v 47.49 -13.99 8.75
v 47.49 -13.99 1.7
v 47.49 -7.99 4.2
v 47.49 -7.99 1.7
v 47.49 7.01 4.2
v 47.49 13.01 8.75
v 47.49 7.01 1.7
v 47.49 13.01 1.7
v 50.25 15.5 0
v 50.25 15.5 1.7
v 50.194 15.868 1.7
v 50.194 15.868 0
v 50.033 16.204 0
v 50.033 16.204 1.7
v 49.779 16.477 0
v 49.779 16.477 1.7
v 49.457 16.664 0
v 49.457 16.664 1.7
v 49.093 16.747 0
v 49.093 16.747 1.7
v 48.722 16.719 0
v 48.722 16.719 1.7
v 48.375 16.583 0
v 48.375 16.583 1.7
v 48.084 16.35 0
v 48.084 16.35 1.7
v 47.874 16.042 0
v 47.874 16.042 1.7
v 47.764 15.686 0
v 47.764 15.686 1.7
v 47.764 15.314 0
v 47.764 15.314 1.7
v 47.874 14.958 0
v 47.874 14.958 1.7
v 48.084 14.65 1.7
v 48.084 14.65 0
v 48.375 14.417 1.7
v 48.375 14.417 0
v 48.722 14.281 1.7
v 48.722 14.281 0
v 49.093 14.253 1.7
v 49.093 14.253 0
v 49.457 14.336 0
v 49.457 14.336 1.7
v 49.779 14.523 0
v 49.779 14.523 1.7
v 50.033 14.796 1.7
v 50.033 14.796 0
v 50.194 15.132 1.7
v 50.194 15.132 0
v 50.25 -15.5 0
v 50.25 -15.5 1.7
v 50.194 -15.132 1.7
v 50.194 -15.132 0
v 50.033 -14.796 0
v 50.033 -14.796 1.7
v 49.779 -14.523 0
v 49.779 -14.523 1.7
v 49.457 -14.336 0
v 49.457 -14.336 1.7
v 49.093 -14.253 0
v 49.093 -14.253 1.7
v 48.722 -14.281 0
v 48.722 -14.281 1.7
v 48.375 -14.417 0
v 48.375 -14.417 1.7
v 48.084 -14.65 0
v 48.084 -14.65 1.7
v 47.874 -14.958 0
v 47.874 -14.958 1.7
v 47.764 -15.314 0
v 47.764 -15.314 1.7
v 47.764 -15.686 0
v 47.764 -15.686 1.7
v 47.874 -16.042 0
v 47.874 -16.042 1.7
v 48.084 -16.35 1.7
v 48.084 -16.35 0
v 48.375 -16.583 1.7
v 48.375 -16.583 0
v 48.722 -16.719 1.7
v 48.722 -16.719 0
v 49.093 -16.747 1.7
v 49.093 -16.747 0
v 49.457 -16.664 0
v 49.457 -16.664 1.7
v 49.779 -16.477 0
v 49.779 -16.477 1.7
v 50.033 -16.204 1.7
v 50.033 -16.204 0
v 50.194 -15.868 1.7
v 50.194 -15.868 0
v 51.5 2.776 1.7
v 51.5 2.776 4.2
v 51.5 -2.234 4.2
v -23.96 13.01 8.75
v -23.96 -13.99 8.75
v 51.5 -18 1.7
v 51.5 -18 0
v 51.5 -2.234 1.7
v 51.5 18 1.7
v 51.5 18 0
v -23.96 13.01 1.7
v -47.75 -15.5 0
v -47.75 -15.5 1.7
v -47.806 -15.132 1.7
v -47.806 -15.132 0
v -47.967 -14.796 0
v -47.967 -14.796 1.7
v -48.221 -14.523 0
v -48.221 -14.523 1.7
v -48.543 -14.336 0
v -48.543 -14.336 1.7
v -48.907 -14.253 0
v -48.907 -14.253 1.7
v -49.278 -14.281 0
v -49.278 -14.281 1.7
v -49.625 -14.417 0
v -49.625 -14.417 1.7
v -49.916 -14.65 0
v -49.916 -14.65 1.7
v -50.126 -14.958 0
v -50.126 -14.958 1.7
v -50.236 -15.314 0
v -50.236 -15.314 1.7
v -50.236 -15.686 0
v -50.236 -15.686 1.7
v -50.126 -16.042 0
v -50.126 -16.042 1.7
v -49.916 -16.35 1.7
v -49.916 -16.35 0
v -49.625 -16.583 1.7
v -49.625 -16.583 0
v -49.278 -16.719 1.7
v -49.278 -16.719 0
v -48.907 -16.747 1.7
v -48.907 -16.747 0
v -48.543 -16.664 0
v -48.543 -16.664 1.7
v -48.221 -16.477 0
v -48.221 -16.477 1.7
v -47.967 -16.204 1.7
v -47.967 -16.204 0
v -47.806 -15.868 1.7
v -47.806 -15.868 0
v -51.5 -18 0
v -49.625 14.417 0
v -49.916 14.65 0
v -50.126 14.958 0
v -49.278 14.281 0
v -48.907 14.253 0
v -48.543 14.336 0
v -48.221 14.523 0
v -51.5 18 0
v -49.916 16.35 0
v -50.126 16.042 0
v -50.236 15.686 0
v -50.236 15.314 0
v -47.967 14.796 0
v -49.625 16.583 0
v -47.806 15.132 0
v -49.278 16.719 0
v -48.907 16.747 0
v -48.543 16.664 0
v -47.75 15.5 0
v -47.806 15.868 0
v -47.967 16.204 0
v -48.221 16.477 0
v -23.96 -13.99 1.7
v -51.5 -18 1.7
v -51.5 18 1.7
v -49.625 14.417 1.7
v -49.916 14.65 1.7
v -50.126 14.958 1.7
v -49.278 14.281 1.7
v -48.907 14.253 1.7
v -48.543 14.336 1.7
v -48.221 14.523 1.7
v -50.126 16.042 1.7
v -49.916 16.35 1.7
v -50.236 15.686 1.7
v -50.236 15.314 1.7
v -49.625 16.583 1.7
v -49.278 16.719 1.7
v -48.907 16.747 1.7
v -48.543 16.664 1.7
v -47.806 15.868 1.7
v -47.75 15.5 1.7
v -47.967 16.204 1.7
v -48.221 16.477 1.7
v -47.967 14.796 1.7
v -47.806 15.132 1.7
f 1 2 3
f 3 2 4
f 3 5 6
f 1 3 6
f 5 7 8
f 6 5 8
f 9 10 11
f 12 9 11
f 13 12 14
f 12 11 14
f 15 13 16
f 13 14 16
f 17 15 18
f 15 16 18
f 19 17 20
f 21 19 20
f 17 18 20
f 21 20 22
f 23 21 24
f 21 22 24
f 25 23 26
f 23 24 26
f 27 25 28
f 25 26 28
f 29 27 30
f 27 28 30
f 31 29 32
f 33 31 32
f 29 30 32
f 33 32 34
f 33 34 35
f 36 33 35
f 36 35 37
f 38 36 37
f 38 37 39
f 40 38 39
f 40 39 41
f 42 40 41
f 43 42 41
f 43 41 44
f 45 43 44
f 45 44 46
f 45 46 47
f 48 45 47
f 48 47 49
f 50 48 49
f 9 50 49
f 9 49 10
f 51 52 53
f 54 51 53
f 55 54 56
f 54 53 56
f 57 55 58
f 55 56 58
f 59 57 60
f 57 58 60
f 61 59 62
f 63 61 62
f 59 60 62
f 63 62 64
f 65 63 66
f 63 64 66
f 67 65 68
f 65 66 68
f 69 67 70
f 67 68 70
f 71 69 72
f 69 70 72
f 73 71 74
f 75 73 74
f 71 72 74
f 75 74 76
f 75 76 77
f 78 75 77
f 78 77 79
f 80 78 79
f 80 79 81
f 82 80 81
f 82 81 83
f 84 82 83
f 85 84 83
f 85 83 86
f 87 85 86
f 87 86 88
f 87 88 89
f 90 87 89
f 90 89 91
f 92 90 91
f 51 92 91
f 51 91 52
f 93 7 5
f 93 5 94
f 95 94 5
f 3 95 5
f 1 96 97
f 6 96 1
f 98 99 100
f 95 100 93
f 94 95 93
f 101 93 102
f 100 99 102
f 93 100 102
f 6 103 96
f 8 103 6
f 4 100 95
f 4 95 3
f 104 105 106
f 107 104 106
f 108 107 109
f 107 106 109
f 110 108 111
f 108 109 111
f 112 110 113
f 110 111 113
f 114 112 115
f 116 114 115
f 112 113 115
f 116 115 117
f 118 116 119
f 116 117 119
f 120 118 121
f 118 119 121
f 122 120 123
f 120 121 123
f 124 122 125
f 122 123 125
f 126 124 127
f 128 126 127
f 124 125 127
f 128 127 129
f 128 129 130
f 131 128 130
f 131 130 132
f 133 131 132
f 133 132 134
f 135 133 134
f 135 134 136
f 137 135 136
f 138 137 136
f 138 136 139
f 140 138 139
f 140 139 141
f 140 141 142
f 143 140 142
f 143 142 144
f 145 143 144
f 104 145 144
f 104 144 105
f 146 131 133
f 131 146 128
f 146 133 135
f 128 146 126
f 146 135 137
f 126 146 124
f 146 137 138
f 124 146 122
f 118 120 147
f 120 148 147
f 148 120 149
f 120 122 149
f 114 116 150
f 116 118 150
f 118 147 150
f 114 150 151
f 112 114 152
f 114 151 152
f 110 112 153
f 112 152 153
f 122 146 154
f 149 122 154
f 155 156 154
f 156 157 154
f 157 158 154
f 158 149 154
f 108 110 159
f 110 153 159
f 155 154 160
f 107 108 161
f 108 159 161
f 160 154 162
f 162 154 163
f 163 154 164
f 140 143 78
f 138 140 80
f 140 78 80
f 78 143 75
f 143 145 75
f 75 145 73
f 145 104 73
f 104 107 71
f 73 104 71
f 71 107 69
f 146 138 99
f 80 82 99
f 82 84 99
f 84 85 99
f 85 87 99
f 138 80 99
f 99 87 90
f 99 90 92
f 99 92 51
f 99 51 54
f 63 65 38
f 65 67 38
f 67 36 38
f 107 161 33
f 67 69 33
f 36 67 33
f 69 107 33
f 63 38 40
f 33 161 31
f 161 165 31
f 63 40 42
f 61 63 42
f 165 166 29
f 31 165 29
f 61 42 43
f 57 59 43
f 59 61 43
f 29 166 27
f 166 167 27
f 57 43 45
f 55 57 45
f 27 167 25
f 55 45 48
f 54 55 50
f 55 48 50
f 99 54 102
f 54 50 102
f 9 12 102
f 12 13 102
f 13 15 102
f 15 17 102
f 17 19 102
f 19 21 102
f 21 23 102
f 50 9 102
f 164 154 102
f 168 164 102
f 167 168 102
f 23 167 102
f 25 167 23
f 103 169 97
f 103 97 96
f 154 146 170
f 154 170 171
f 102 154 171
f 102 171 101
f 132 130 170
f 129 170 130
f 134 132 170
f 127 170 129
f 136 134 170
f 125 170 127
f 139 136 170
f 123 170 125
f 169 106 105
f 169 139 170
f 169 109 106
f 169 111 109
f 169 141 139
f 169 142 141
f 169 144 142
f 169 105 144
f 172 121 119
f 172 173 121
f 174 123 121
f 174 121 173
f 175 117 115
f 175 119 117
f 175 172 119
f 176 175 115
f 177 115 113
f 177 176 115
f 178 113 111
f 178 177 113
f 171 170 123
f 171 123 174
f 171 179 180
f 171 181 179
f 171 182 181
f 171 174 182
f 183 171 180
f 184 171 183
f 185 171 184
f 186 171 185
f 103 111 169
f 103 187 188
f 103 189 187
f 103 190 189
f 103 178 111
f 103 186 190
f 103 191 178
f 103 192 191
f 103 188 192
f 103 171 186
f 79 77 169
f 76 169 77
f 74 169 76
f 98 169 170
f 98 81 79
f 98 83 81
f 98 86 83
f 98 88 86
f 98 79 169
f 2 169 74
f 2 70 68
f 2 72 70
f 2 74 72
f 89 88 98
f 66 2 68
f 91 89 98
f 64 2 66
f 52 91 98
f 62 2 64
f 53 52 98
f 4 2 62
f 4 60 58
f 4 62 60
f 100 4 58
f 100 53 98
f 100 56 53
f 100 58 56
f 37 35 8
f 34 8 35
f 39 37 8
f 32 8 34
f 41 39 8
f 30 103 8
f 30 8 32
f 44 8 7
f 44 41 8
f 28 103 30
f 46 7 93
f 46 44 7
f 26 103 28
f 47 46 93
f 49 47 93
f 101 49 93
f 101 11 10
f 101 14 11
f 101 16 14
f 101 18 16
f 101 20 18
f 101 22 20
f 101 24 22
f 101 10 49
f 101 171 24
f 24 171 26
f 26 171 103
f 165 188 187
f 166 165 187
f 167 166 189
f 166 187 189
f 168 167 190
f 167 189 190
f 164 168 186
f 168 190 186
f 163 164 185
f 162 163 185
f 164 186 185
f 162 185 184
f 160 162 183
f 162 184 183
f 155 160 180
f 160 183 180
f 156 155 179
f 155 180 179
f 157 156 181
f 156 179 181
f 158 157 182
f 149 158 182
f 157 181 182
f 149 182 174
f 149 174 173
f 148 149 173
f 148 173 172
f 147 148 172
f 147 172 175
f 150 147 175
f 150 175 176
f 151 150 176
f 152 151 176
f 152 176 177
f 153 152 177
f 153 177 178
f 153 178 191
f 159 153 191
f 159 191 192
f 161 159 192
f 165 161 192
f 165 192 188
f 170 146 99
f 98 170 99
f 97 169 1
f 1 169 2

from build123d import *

# Parameters (mm, degrees)
CROQUIS1_W              = 103
CROQUIS1_H              = 36
SALIENTE_EXTRUIR1_DEPTH = 1.7
CROQUIS2_W              = 71.45
CROQUIS2_H              = 27
SALIENTE_EXTRUIR2_DEPTH = 7.05
CROQUIS3_R              = 1.25
CORTAR_EXTRUIR1_DEPTH   = 6
SALIENTE_EXTRUIR3_DEPTH = 2.5


with BuildPart() as part:
    # Croquis1 → Saliente-Extruir1 (new body)
    with BuildSketch(Plane.XY):
        Rectangle(CROQUIS1_W, CROQUIS1_H)
    extrude(amount=SALIENTE_EXTRUIR1_DEPTH)

    # Croquis2 → Saliente-Extruir2 (add)
    with BuildSketch(Plane.XY.offset(1.7)):
        with Locations((11.765, -0.49)):
            Rectangle(CROQUIS2_W, CROQUIS2_H)
    extrude(amount=SALIENTE_EXTRUIR2_DEPTH)

    # Croquis3 → Cortar-Extruir1 (cut)
    with BuildSketch(Plane.XY.offset(1.7)):
        with Locations((-49, 15.5)):
            Circle(CROQUIS3_R)
        with Locations((-49, -15.5)):
            Circle(CROQUIS3_R)
        with Locations((49, 15.5)):
            Circle(CROQUIS3_R)
        with Locations((49, -15.5)):
            Circle(CROQUIS3_R)
    extrude(amount=-CORTAR_EXTRUIR1_DEPTH, mode=Mode.SUBTRACT)

    # Croquis4 → Saliente-Extruir3 (add)
    with BuildSketch(Plane.XY.offset(1.7)):
        Polygon((47.49, 7.01), (51.5, 2.775802991), (51.5, -2.234197009), (47.49, -7.99), align=None)
    extrude(amount=SALIENTE_EXTRUIR3_DEPTH)


solid = part.part
